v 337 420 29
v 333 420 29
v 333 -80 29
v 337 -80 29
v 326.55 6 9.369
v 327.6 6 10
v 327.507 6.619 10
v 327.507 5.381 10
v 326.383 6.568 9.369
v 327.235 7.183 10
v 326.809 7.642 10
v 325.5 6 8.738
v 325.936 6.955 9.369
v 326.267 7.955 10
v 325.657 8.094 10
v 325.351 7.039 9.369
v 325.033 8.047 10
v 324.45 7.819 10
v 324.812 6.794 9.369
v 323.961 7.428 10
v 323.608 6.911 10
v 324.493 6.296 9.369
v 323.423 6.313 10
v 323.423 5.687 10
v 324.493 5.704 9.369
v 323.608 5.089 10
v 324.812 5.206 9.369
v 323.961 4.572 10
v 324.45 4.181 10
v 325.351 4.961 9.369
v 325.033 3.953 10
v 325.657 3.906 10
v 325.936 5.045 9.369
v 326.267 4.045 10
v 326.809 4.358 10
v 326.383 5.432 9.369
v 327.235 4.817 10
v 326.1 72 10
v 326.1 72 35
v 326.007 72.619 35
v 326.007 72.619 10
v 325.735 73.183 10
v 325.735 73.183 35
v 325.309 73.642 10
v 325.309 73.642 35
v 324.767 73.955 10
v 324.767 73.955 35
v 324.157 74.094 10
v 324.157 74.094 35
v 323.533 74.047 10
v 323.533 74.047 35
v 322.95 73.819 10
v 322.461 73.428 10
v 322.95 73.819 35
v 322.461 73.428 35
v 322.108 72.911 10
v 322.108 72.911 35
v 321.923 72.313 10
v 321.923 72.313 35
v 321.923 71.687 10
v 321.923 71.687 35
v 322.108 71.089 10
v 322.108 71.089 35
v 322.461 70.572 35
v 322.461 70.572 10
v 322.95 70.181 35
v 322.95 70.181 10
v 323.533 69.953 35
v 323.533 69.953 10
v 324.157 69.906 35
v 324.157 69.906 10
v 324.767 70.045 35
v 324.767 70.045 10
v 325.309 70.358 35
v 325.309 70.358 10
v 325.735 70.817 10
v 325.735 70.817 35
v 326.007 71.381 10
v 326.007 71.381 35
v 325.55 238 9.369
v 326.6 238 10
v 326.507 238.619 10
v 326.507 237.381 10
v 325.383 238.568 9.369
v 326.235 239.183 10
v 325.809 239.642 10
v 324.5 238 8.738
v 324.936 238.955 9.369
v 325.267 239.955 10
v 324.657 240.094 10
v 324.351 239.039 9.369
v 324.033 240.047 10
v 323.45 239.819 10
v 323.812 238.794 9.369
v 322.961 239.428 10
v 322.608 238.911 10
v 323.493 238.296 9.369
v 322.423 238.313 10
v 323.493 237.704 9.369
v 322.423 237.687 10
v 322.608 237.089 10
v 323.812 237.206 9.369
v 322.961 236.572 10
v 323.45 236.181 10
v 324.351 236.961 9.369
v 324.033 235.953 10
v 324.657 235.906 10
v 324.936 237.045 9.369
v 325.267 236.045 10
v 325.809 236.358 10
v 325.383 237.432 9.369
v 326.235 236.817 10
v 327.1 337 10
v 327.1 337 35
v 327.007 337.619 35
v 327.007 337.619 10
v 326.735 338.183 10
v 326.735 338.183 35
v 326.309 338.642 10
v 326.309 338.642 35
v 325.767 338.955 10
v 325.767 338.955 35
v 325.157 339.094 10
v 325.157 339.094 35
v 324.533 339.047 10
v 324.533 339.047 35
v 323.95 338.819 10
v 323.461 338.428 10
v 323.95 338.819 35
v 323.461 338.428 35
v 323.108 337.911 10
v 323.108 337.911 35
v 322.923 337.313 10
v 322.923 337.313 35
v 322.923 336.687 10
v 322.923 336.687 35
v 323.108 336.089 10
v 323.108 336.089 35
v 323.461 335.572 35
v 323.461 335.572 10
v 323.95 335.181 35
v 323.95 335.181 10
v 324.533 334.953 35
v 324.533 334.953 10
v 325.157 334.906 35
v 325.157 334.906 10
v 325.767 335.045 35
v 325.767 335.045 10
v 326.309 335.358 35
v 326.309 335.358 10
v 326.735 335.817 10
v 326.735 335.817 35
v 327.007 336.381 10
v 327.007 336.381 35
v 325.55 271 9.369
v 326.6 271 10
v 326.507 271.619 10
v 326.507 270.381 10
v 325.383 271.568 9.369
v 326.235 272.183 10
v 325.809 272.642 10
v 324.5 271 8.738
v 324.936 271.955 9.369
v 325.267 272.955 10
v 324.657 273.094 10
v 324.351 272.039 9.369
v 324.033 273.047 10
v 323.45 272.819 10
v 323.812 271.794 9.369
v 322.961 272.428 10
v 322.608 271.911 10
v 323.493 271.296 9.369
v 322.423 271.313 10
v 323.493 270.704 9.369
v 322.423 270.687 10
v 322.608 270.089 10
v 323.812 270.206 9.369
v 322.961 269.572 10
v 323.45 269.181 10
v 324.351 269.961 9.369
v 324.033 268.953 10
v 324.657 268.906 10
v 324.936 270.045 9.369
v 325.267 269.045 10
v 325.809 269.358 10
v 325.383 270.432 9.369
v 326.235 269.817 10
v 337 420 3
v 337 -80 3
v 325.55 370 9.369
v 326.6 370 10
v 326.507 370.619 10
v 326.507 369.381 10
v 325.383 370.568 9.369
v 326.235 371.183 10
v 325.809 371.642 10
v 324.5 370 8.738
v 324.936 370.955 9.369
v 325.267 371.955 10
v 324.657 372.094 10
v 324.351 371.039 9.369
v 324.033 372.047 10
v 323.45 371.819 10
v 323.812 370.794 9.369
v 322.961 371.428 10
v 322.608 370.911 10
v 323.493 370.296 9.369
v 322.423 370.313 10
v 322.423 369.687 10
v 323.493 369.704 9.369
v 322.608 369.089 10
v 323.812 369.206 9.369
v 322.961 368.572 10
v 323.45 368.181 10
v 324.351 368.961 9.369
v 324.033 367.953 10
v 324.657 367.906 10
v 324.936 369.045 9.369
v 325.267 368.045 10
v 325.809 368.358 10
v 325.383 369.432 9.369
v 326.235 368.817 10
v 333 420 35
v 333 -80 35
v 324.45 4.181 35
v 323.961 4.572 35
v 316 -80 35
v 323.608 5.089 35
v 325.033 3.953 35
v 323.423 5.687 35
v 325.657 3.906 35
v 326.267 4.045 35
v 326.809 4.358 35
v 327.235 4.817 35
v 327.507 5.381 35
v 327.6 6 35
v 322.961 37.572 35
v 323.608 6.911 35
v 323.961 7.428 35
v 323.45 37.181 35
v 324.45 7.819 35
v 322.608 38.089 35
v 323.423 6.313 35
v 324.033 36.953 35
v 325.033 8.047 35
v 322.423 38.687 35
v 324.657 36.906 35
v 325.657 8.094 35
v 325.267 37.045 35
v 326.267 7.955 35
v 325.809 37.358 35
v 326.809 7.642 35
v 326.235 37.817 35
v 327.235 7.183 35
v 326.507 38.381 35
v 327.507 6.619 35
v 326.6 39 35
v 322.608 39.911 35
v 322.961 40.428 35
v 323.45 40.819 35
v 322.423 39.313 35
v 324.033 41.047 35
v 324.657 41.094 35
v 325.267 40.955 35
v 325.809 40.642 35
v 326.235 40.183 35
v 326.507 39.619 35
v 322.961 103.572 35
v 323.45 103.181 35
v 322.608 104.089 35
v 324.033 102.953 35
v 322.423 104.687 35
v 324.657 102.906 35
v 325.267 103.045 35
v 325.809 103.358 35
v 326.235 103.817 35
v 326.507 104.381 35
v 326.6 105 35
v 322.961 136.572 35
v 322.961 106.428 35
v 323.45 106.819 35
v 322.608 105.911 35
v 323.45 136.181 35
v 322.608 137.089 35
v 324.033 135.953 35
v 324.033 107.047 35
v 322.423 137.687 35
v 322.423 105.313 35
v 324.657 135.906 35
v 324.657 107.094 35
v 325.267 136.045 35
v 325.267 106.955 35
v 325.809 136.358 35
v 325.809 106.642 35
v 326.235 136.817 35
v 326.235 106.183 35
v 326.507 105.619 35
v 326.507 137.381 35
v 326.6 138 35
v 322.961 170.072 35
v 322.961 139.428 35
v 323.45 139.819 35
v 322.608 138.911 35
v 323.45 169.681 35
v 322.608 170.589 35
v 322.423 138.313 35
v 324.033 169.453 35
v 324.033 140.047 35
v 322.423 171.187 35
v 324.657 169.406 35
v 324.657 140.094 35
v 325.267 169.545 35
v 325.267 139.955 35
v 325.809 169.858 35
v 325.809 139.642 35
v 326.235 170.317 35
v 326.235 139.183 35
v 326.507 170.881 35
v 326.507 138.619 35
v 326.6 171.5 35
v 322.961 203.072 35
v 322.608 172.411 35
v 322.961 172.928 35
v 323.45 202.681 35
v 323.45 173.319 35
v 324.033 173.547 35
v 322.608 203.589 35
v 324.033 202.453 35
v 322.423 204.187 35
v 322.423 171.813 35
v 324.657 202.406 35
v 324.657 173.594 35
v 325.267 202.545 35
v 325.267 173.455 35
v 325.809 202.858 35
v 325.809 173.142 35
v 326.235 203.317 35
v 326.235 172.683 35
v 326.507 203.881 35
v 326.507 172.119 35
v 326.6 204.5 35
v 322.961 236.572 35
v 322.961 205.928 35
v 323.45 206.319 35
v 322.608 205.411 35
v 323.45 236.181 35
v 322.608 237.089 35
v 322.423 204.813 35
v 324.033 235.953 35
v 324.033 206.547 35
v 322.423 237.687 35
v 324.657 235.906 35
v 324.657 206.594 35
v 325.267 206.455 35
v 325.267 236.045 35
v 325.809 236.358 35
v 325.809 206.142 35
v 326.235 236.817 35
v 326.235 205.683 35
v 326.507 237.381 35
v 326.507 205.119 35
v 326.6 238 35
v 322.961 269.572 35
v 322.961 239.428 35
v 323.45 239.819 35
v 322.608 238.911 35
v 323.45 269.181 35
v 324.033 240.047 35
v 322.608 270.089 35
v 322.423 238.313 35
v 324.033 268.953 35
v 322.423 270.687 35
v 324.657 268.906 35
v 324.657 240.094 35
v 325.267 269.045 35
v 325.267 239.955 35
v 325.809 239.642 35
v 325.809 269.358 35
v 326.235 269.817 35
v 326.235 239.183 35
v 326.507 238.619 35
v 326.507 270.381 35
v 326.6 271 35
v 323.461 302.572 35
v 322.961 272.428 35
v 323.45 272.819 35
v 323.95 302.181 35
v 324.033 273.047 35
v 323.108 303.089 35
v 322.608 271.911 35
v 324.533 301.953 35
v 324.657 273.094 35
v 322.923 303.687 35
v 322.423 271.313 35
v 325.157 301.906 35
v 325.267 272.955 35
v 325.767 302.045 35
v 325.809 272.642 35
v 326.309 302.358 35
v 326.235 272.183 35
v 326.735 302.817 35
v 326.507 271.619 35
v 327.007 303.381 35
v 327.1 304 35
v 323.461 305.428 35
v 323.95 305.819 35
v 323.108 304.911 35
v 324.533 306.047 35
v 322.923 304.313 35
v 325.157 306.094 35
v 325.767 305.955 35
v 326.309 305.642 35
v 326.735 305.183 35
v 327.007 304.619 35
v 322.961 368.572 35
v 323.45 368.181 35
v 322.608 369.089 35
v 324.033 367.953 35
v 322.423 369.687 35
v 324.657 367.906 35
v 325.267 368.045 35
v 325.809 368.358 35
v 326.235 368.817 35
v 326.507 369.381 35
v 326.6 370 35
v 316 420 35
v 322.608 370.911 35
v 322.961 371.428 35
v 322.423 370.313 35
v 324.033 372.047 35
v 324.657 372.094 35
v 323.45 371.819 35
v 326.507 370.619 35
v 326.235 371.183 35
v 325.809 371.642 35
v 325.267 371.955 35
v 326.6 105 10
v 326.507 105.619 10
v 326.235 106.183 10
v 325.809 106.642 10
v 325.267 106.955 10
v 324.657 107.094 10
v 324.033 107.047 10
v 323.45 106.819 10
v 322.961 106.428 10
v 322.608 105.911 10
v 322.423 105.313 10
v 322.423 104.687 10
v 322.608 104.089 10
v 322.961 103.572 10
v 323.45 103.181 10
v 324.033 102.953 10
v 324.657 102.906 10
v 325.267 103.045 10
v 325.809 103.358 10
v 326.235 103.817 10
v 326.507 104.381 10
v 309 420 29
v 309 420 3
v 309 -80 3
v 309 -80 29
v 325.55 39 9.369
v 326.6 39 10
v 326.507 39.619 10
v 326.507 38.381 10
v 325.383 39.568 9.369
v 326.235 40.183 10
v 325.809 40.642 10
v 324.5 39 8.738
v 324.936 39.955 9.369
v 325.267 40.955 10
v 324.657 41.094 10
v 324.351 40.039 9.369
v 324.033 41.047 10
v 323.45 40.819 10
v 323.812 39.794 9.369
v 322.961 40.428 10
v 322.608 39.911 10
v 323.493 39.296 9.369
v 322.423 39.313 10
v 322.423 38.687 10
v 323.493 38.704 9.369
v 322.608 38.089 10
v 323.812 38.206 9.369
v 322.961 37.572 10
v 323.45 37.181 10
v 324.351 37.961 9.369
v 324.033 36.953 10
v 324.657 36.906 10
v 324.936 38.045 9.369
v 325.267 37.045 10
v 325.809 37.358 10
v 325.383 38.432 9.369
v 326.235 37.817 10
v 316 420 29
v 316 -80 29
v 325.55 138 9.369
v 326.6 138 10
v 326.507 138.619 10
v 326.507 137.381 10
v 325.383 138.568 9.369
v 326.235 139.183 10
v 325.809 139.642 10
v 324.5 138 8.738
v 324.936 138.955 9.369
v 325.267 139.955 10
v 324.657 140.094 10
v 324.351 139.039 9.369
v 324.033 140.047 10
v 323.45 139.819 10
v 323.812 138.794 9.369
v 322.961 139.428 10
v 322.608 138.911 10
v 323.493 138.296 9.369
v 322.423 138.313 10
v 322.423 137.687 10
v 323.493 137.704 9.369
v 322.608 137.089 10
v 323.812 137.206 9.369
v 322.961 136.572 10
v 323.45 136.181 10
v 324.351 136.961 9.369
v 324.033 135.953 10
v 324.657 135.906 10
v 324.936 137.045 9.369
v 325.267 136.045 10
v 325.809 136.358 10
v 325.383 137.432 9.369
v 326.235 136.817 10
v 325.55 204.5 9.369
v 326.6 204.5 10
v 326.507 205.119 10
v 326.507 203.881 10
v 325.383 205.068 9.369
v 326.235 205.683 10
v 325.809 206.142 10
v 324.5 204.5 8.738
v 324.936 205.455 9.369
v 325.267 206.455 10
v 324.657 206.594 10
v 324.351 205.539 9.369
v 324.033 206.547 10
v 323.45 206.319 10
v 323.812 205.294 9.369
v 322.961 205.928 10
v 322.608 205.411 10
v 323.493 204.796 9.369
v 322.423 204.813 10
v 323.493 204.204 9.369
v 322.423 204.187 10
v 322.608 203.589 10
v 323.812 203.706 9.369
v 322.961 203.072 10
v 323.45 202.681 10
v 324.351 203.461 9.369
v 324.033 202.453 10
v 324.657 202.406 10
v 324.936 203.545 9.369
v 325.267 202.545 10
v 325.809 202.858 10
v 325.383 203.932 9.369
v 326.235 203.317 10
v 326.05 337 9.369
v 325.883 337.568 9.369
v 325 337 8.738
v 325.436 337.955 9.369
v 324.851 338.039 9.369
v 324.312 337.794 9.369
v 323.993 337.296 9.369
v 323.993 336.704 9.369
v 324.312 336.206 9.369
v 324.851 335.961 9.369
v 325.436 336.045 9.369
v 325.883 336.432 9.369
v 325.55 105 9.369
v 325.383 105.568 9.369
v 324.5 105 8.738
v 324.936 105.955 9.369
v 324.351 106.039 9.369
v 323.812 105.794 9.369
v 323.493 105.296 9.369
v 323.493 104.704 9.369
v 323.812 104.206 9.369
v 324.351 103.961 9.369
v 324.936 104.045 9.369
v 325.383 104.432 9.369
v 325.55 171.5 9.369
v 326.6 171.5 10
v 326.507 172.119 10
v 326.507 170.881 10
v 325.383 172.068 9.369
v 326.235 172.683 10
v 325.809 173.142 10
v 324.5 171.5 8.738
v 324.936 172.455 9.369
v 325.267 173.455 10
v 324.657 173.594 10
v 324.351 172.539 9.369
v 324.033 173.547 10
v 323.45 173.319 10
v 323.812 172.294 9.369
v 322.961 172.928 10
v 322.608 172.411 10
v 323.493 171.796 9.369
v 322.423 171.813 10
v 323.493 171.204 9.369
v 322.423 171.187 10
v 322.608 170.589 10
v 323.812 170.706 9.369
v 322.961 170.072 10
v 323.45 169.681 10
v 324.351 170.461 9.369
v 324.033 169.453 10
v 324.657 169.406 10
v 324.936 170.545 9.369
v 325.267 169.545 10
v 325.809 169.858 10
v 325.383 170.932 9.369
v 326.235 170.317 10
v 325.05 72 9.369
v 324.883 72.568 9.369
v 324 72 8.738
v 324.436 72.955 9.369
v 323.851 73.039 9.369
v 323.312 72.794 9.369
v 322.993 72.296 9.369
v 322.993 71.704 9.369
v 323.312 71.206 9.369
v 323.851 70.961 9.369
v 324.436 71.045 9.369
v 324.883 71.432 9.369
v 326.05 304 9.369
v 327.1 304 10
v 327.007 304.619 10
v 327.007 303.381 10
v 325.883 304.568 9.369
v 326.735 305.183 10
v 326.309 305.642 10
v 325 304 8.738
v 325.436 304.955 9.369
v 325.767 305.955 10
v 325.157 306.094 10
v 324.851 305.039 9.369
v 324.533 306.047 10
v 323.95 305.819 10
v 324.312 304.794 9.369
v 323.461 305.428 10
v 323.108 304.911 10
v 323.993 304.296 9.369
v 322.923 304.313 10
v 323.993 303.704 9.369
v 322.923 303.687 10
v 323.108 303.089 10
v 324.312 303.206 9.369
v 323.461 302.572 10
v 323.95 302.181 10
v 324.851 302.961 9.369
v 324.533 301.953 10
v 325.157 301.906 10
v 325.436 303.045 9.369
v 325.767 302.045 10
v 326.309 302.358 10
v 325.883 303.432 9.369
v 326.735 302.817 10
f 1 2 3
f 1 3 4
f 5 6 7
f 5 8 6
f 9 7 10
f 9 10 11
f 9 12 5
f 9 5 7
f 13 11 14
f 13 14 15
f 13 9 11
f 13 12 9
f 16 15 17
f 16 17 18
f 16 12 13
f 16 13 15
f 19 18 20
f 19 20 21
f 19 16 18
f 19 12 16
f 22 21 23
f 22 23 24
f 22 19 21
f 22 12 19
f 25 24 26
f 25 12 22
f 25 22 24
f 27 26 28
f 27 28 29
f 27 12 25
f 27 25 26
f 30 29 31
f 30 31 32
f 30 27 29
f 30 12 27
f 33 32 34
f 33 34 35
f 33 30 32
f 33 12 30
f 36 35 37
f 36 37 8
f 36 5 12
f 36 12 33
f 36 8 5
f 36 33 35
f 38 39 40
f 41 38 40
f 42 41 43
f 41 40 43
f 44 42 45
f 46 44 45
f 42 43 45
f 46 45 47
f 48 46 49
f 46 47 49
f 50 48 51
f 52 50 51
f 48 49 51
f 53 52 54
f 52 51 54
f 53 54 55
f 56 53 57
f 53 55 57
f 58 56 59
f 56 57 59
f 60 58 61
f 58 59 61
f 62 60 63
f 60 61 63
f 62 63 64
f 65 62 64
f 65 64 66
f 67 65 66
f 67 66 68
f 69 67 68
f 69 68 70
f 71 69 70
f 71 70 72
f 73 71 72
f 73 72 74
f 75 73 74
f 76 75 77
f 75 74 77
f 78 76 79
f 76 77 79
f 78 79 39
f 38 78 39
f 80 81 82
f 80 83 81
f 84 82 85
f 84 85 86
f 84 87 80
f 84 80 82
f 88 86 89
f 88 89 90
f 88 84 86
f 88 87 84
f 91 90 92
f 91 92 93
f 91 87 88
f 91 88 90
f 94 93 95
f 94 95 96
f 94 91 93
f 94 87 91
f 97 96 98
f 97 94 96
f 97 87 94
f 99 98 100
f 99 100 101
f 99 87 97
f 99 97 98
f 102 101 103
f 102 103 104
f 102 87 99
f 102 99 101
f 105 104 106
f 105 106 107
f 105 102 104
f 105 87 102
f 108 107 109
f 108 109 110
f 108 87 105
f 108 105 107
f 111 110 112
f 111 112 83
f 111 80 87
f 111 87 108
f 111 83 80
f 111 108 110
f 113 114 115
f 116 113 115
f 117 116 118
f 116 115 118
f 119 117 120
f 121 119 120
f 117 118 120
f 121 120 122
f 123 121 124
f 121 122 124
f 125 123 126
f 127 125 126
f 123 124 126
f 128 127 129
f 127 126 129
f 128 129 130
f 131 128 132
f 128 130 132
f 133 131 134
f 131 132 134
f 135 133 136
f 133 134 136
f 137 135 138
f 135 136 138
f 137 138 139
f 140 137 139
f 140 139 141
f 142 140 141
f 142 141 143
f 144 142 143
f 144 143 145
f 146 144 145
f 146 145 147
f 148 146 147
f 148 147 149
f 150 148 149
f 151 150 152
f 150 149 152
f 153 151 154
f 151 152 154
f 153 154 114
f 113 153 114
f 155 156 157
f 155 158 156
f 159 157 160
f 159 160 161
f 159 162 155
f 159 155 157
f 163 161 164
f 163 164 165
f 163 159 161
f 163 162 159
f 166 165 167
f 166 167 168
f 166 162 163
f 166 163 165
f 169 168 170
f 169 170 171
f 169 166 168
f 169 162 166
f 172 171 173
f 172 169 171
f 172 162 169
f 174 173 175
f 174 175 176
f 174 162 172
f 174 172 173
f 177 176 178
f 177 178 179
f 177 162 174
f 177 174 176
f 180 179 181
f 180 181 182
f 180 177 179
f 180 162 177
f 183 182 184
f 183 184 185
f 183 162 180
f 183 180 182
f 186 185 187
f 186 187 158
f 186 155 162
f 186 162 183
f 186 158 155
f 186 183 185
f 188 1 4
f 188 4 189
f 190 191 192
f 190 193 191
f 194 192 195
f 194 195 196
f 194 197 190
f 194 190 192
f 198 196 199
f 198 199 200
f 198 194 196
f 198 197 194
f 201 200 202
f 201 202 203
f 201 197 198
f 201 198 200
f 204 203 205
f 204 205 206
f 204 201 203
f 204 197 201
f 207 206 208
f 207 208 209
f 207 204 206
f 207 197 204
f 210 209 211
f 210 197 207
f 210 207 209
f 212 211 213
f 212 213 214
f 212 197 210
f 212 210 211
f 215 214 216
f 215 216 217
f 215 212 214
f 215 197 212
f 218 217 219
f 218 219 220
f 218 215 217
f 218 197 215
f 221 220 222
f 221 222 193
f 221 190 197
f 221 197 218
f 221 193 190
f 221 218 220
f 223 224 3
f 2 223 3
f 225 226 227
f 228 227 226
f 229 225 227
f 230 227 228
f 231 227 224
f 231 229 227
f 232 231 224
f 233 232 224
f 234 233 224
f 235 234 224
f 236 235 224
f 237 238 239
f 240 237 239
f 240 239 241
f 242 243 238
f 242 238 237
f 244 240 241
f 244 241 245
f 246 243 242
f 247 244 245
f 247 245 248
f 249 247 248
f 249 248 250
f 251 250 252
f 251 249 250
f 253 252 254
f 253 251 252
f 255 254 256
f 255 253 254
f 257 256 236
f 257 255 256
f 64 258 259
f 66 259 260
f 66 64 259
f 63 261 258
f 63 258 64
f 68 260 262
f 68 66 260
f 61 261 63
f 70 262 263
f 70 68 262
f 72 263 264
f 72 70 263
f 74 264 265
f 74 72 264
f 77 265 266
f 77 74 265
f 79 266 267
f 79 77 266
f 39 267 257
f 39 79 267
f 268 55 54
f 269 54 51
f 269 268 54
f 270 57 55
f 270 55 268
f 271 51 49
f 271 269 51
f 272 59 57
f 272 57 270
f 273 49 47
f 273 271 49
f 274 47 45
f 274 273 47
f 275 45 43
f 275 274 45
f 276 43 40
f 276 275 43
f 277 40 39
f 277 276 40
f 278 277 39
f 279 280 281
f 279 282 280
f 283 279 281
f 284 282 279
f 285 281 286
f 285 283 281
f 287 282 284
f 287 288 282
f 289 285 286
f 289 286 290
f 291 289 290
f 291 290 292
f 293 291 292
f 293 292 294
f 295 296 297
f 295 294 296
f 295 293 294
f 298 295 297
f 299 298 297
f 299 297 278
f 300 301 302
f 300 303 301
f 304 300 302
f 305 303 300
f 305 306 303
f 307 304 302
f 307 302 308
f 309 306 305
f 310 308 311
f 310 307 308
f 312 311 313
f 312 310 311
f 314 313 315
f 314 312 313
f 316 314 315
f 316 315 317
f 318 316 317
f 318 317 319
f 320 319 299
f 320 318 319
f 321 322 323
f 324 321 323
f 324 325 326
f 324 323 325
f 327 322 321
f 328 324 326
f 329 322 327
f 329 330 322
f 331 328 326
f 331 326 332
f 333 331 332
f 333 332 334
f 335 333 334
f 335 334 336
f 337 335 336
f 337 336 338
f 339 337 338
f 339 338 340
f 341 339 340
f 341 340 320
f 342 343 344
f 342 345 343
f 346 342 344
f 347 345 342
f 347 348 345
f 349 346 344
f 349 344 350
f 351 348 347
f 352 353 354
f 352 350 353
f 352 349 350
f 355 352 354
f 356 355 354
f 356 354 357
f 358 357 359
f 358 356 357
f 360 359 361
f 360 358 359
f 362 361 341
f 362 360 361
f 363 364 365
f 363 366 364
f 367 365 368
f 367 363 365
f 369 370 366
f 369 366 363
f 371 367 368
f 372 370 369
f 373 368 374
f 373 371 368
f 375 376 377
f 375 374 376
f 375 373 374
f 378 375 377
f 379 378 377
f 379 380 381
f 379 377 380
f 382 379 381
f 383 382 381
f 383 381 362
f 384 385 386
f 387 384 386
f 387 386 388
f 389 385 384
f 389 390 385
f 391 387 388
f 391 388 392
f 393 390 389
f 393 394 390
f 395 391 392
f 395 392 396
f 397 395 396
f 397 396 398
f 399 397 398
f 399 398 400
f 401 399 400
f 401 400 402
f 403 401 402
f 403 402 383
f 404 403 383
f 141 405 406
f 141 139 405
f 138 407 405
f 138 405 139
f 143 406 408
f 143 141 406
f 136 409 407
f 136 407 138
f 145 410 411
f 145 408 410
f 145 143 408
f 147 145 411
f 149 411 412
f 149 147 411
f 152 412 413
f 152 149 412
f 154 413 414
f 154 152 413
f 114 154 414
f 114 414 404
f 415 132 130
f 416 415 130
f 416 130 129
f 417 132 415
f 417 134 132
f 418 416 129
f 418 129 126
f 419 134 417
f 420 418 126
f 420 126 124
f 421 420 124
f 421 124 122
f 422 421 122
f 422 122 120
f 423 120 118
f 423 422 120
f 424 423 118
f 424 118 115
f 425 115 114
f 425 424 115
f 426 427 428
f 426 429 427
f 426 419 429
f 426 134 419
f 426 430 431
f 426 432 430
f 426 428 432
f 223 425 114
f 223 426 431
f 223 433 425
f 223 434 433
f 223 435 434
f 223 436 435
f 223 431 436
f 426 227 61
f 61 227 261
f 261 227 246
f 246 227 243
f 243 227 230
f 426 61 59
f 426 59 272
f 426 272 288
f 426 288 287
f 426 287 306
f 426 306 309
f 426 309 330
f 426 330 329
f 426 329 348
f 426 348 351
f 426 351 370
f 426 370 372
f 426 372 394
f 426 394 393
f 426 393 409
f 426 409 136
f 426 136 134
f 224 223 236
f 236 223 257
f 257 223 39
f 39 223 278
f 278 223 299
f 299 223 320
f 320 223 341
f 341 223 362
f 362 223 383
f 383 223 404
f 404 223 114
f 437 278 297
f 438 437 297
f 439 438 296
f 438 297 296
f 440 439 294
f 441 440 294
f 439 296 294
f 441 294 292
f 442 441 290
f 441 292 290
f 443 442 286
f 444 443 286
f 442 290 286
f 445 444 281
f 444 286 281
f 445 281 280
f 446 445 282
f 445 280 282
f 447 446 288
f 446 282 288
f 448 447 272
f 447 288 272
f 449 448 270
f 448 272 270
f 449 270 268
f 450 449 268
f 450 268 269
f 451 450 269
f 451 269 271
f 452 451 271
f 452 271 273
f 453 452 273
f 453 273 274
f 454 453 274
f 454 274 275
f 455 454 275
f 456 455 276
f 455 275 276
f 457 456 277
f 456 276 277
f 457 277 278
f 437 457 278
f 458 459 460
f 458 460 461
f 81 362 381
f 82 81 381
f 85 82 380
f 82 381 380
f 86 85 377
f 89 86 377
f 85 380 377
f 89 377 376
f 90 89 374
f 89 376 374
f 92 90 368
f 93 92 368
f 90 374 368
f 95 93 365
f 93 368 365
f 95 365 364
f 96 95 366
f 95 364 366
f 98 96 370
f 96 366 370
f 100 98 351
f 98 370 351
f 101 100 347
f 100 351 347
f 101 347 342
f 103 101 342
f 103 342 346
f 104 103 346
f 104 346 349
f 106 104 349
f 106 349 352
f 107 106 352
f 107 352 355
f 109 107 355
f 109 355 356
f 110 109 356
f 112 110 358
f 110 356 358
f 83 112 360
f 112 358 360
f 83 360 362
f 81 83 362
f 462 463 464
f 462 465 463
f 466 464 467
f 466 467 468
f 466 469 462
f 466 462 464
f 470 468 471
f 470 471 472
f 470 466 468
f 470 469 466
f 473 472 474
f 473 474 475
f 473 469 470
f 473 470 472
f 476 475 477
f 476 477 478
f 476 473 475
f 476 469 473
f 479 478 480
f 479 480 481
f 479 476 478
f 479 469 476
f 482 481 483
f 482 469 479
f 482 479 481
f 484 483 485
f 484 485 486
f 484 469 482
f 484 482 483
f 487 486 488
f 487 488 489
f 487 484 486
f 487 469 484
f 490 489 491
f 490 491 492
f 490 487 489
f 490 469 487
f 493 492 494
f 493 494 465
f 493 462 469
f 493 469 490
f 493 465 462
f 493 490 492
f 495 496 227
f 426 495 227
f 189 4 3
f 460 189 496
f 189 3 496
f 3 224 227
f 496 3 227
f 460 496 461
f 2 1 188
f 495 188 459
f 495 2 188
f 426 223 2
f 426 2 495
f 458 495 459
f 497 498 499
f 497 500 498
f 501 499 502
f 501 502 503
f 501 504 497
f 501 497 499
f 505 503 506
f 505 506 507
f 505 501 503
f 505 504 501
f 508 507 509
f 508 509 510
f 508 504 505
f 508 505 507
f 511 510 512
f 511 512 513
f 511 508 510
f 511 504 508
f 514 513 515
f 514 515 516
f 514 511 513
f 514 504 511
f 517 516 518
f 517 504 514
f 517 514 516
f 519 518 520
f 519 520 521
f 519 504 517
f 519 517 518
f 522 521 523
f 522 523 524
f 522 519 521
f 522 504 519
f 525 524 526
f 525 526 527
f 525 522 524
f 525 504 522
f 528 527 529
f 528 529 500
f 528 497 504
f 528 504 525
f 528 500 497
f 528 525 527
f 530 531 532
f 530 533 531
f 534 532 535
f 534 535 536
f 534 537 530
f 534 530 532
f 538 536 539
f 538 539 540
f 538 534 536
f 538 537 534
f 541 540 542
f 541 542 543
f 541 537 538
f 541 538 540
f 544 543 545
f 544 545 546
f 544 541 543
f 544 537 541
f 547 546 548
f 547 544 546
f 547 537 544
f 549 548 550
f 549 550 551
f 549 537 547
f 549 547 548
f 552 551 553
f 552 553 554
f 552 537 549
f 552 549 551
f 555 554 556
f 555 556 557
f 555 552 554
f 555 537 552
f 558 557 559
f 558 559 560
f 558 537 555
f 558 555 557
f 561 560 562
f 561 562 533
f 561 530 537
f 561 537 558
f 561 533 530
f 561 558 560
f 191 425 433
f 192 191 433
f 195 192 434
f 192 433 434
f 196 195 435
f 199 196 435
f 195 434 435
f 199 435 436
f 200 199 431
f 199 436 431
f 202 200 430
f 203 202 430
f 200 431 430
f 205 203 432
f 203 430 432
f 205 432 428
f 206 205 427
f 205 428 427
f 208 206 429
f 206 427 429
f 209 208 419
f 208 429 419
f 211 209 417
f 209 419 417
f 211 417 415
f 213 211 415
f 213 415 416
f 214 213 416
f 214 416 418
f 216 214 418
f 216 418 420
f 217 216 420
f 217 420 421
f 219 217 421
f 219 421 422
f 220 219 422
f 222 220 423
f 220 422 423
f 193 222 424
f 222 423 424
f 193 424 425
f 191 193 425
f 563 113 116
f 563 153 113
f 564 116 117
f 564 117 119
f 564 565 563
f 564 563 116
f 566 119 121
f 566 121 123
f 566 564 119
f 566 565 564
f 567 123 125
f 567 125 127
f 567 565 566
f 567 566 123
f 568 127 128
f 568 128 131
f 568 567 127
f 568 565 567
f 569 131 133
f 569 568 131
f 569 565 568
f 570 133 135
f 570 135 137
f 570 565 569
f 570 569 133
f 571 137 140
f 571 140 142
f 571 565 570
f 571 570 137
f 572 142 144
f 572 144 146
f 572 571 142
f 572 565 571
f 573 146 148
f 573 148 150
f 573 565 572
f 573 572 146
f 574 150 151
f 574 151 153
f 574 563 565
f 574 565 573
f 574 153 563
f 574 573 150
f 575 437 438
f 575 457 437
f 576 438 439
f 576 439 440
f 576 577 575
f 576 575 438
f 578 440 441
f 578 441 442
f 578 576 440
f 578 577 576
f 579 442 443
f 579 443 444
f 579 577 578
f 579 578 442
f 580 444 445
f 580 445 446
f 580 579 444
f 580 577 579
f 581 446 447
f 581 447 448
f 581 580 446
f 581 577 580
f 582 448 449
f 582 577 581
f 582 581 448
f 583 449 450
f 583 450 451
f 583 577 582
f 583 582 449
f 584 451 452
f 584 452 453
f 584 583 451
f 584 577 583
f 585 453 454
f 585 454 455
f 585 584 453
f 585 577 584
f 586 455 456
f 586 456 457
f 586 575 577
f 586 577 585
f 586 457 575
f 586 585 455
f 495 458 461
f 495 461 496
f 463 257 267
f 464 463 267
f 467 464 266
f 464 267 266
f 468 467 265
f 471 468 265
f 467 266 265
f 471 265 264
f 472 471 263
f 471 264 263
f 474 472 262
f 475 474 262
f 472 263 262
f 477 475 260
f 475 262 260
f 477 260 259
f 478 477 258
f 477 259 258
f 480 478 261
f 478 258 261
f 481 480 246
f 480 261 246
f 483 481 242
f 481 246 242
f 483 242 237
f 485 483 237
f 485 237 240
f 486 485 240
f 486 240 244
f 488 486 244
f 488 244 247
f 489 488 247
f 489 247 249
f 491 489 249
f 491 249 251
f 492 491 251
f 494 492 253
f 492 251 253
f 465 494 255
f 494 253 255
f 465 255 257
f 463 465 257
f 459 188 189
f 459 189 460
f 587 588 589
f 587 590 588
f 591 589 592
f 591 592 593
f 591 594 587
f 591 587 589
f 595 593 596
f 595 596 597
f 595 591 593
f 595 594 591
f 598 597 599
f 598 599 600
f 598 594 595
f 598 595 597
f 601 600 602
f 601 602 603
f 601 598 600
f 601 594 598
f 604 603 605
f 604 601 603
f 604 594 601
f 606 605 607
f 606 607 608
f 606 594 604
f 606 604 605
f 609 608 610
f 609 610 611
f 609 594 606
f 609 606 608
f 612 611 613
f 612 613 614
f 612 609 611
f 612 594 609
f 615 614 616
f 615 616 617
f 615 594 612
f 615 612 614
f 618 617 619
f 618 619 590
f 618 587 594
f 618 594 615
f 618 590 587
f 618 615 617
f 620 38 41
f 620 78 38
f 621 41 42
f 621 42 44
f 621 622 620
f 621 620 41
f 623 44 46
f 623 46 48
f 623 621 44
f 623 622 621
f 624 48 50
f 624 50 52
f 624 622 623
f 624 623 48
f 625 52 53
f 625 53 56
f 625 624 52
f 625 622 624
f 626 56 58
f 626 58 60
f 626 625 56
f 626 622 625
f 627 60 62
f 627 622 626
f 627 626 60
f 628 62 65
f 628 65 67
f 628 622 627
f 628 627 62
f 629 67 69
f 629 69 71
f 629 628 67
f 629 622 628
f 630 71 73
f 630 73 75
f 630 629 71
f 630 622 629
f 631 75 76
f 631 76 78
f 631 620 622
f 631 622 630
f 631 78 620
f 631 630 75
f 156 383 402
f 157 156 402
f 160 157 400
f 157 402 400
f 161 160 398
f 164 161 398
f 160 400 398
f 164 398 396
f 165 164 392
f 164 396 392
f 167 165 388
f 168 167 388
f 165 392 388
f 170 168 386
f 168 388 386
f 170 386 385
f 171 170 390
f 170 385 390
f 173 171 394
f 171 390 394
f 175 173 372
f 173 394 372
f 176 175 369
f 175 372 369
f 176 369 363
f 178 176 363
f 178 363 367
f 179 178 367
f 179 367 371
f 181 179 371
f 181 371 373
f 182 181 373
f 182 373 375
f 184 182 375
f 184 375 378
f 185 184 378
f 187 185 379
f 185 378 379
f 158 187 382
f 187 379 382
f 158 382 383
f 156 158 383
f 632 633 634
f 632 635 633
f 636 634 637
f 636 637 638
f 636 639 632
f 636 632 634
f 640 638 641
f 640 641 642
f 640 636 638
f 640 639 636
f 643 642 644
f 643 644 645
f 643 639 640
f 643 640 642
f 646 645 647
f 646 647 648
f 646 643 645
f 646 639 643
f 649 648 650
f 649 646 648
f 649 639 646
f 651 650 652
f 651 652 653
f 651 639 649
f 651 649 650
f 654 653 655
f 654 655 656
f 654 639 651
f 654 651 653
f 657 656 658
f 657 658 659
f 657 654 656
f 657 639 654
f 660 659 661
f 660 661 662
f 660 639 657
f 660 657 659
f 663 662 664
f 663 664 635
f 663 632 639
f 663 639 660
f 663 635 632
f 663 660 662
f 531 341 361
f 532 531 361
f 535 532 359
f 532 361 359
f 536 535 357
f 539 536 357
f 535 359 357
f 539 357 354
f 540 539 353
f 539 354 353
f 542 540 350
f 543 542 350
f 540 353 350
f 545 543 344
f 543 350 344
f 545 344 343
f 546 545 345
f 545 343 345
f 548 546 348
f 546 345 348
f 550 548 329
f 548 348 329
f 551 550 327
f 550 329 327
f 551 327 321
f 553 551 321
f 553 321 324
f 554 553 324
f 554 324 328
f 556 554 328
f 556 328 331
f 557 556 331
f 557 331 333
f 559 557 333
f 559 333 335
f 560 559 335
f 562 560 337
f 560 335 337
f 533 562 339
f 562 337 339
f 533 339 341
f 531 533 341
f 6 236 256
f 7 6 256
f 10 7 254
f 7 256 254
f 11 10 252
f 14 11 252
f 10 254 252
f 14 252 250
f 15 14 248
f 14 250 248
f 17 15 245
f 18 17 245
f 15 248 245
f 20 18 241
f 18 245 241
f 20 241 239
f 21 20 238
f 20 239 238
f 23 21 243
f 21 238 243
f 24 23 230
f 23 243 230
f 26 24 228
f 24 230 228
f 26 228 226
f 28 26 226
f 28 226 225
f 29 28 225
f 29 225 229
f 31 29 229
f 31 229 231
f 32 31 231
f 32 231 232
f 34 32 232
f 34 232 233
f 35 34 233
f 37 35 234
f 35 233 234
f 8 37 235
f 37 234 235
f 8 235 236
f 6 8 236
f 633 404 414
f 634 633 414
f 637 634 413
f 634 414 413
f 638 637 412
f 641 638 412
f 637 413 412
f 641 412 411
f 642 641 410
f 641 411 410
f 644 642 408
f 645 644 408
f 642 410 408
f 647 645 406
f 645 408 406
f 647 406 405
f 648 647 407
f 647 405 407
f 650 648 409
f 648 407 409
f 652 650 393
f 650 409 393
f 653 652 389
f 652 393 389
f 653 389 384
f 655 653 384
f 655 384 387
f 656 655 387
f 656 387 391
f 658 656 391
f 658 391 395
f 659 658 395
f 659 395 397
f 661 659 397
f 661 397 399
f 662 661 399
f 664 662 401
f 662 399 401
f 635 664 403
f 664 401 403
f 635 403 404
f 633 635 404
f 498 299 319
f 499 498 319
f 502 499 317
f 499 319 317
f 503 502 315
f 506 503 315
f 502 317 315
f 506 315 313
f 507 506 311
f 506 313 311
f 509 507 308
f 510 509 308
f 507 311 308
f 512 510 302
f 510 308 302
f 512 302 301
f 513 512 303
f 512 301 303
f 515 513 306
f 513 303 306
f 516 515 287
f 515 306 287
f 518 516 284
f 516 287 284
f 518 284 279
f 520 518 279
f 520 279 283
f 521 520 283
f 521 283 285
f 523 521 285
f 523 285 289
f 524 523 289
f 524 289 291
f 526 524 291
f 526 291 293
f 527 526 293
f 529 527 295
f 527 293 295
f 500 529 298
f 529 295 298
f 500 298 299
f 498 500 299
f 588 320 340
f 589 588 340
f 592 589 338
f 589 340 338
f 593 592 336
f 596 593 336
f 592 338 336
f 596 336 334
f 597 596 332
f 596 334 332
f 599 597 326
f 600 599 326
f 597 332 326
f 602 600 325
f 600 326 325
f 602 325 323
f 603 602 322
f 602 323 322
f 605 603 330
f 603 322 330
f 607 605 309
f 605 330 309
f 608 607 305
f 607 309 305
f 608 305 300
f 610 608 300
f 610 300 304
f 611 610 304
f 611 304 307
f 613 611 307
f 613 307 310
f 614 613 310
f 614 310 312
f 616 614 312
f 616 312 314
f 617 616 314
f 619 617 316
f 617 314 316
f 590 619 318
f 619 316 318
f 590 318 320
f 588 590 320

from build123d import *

# Parameters (mm, degrees)
PAD010_DEPTH   = 500
SKETCH024_R    = 2.1
HOLE005_DEPTH  = 25
HOLE005_TIPS_R = 2.1


with BuildPart() as part:
    # Sketch023 → Pad010 (new body)
    with BuildSketch(Plane.XZ):
        Polygon((7, 0), (24, 0), (24, -6), (28, -6), (28, -32), (0, -32), (0, -6), (7, -6), align=None)
    extrude(amount=PAD010_DEPTH)

    # Sketch024 → Hole005 (cut)
    with BuildSketch(Plane.XY):
        with Locations((16.5, -414)):
            Circle(SKETCH024_R)
        with Locations((15.5, -381)):
            Circle(SKETCH024_R)
        with Locations((15, -348)):
            Circle(SKETCH024_R)
        with Locations((15.5, -315)):
            Circle(SKETCH024_R)
        with Locations((15.5, -282)):
            Circle(SKETCH024_R)
        with Locations((15.5, -248.5)):
            Circle(SKETCH024_R)
        with Locations((15.5, -215.5)):
            Circle(SKETCH024_R)
        with Locations((15.5, -182)):
            Circle(SKETCH024_R)
        with Locations((15.5, -149)):
            Circle(SKETCH024_R)
        with Locations((16, -116)):
            Circle(SKETCH024_R)
        with Locations((16, -83)):
            Circle(SKETCH024_R)
        with Locations((15.5, -50)):
            Circle(SKETCH024_R)
    extrude(amount=-HOLE005_DEPTH, mode=Mode.SUBTRACT)

    # Hole005 tips → Hole005 tip 1 section 0
    with BuildSketch(Plane.XY.offset(-25), mode=Mode.PRIVATE) as hole005_tip_1_s0:
        with Locations((16.5, -414)):
            Circle(HOLE005_TIPS_R)
    loft([hole005_tip_1_s0.sketch, Vertex(16.5, -414, -26.261807)], mode=Mode.SUBTRACT)

    # Hole005 tips → Hole005 tip 2 section 0
    with BuildSketch(Plane.XY.offset(-25), mode=Mode.PRIVATE) as hole005_tip_2_s0:
        with Locations((15.5, -381)):
            Circle(HOLE005_TIPS_R)
    loft([hole005_tip_2_s0.sketch, Vertex(15.5, -381, -26.261807)], mode=Mode.SUBTRACT)

    # Hole005 tips → Hole005 tip 3 section 0
    with BuildSketch(Plane.XY.offset(-25), mode=Mode.PRIVATE) as hole005_tip_3_s0:
        with Locations((15, -348)):
            Circle(HOLE005_TIPS_R)
    loft([hole005_tip_3_s0.sketch, Vertex(15, -348, -26.261807)], mode=Mode.SUBTRACT)

    # Hole005 tips → Hole005 tip 4 section 0
    with BuildSketch(Plane.XY.offset(-25), mode=Mode.PRIVATE) as hole005_tip_4_s0:
        with Locations((15.5, -315)):
            Circle(HOLE005_TIPS_R)
    loft([hole005_tip_4_s0.sketch, Vertex(15.5, -315, -26.261807)], mode=Mode.SUBTRACT)

    # Hole005 tips → Hole005 tip 5 section 0
    with BuildSketch(Plane.XY.offset(-25), mode=Mode.PRIVATE) as hole005_tip_5_s0:
        with Locations((15.5, -282)):
            Circle(HOLE005_TIPS_R)
    loft([hole005_tip_5_s0.sketch, Vertex(15.5, -282, -26.261807)], mode=Mode.SUBTRACT)

    # Hole005 tips → Hole005 tip 6 section 0
    with BuildSketch(Plane.XY.offset(-25), mode=Mode.PRIVATE) as hole005_tip_6_s0:
        with Locations((15.5, -248.5)):
            Circle(HOLE005_TIPS_R)
    loft([hole005_tip_6_s0.sketch, Vertex(15.5, -248.5, -26.261807)], mode=Mode.SUBTRACT)

    # Hole005 tips → Hole005 tip 7 section 0
    with BuildSketch(Plane.XY.offset(-25), mode=Mode.PRIVATE) as hole005_tip_7_s0:
        with Locations((15.5, -215.5)):
            Circle(HOLE005_TIPS_R)
    loft([hole005_tip_7_s0.sketch, Vertex(15.5, -215.5, -26.261807)], mode=Mode.SUBTRACT)

    # Hole005 tips → Hole005 tip 8 section 0
    with BuildSketch(Plane.XY.offset(-25), mode=Mode.PRIVATE) as hole005_tip_8_s0:
        with Locations((15.5, -182)):
            Circle(HOLE005_TIPS_R)
    loft([hole005_tip_8_s0.sketch, Vertex(15.5, -182, -26.261807)], mode=Mode.SUBTRACT)

    # Hole005 tips → Hole005 tip 9 section 0
    with BuildSketch(Plane.XY.offset(-25), mode=Mode.PRIVATE) as hole005_tip_9_s0:
        with Locations((15.5, -149)):
            Circle(HOLE005_TIPS_R)
    loft([hole005_tip_9_s0.sketch, Vertex(15.5, -149, -26.261807)], mode=Mode.SUBTRACT)

    # Hole005 tips → Hole005 tip 10 section 0
    with BuildSketch(Plane.XY.offset(-25), mode=Mode.PRIVATE) as hole005_tip_10_s0:
        with Locations((16, -116)):
            Circle(HOLE005_TIPS_R)
    loft([hole005_tip_10_s0.sketch, Vertex(16, -116, -26.261807)], mode=Mode.SUBTRACT)

    # Hole005 tips → Hole005 tip 11 section 0
    with BuildSketch(Plane.XY.offset(-25), mode=Mode.PRIVATE) as hole005_tip_11_s0:
        with Locations((16, -83)):
            Circle(HOLE005_TIPS_R)
    loft([hole005_tip_11_s0.sketch, Vertex(16, -83, -26.261807)], mode=Mode.SUBTRACT)

    # Hole005 tips → Hole005 tip 12 section 0
    with BuildSketch(Plane.XY.offset(-25), mode=Mode.PRIVATE) as hole005_tip_12_s0:
        with Locations((15.5, -50)):
            Circle(HOLE005_TIPS_R)
    loft([hole005_tip_12_s0.sketch, Vertex(15.5, -50, -26.261807)], mode=Mode.SUBTRACT)


with BuildPart() as part_1:
    # Body007 placement: moved
    add(part.part.moved(Location((309, 420, 35))))


solid = part_1.part
